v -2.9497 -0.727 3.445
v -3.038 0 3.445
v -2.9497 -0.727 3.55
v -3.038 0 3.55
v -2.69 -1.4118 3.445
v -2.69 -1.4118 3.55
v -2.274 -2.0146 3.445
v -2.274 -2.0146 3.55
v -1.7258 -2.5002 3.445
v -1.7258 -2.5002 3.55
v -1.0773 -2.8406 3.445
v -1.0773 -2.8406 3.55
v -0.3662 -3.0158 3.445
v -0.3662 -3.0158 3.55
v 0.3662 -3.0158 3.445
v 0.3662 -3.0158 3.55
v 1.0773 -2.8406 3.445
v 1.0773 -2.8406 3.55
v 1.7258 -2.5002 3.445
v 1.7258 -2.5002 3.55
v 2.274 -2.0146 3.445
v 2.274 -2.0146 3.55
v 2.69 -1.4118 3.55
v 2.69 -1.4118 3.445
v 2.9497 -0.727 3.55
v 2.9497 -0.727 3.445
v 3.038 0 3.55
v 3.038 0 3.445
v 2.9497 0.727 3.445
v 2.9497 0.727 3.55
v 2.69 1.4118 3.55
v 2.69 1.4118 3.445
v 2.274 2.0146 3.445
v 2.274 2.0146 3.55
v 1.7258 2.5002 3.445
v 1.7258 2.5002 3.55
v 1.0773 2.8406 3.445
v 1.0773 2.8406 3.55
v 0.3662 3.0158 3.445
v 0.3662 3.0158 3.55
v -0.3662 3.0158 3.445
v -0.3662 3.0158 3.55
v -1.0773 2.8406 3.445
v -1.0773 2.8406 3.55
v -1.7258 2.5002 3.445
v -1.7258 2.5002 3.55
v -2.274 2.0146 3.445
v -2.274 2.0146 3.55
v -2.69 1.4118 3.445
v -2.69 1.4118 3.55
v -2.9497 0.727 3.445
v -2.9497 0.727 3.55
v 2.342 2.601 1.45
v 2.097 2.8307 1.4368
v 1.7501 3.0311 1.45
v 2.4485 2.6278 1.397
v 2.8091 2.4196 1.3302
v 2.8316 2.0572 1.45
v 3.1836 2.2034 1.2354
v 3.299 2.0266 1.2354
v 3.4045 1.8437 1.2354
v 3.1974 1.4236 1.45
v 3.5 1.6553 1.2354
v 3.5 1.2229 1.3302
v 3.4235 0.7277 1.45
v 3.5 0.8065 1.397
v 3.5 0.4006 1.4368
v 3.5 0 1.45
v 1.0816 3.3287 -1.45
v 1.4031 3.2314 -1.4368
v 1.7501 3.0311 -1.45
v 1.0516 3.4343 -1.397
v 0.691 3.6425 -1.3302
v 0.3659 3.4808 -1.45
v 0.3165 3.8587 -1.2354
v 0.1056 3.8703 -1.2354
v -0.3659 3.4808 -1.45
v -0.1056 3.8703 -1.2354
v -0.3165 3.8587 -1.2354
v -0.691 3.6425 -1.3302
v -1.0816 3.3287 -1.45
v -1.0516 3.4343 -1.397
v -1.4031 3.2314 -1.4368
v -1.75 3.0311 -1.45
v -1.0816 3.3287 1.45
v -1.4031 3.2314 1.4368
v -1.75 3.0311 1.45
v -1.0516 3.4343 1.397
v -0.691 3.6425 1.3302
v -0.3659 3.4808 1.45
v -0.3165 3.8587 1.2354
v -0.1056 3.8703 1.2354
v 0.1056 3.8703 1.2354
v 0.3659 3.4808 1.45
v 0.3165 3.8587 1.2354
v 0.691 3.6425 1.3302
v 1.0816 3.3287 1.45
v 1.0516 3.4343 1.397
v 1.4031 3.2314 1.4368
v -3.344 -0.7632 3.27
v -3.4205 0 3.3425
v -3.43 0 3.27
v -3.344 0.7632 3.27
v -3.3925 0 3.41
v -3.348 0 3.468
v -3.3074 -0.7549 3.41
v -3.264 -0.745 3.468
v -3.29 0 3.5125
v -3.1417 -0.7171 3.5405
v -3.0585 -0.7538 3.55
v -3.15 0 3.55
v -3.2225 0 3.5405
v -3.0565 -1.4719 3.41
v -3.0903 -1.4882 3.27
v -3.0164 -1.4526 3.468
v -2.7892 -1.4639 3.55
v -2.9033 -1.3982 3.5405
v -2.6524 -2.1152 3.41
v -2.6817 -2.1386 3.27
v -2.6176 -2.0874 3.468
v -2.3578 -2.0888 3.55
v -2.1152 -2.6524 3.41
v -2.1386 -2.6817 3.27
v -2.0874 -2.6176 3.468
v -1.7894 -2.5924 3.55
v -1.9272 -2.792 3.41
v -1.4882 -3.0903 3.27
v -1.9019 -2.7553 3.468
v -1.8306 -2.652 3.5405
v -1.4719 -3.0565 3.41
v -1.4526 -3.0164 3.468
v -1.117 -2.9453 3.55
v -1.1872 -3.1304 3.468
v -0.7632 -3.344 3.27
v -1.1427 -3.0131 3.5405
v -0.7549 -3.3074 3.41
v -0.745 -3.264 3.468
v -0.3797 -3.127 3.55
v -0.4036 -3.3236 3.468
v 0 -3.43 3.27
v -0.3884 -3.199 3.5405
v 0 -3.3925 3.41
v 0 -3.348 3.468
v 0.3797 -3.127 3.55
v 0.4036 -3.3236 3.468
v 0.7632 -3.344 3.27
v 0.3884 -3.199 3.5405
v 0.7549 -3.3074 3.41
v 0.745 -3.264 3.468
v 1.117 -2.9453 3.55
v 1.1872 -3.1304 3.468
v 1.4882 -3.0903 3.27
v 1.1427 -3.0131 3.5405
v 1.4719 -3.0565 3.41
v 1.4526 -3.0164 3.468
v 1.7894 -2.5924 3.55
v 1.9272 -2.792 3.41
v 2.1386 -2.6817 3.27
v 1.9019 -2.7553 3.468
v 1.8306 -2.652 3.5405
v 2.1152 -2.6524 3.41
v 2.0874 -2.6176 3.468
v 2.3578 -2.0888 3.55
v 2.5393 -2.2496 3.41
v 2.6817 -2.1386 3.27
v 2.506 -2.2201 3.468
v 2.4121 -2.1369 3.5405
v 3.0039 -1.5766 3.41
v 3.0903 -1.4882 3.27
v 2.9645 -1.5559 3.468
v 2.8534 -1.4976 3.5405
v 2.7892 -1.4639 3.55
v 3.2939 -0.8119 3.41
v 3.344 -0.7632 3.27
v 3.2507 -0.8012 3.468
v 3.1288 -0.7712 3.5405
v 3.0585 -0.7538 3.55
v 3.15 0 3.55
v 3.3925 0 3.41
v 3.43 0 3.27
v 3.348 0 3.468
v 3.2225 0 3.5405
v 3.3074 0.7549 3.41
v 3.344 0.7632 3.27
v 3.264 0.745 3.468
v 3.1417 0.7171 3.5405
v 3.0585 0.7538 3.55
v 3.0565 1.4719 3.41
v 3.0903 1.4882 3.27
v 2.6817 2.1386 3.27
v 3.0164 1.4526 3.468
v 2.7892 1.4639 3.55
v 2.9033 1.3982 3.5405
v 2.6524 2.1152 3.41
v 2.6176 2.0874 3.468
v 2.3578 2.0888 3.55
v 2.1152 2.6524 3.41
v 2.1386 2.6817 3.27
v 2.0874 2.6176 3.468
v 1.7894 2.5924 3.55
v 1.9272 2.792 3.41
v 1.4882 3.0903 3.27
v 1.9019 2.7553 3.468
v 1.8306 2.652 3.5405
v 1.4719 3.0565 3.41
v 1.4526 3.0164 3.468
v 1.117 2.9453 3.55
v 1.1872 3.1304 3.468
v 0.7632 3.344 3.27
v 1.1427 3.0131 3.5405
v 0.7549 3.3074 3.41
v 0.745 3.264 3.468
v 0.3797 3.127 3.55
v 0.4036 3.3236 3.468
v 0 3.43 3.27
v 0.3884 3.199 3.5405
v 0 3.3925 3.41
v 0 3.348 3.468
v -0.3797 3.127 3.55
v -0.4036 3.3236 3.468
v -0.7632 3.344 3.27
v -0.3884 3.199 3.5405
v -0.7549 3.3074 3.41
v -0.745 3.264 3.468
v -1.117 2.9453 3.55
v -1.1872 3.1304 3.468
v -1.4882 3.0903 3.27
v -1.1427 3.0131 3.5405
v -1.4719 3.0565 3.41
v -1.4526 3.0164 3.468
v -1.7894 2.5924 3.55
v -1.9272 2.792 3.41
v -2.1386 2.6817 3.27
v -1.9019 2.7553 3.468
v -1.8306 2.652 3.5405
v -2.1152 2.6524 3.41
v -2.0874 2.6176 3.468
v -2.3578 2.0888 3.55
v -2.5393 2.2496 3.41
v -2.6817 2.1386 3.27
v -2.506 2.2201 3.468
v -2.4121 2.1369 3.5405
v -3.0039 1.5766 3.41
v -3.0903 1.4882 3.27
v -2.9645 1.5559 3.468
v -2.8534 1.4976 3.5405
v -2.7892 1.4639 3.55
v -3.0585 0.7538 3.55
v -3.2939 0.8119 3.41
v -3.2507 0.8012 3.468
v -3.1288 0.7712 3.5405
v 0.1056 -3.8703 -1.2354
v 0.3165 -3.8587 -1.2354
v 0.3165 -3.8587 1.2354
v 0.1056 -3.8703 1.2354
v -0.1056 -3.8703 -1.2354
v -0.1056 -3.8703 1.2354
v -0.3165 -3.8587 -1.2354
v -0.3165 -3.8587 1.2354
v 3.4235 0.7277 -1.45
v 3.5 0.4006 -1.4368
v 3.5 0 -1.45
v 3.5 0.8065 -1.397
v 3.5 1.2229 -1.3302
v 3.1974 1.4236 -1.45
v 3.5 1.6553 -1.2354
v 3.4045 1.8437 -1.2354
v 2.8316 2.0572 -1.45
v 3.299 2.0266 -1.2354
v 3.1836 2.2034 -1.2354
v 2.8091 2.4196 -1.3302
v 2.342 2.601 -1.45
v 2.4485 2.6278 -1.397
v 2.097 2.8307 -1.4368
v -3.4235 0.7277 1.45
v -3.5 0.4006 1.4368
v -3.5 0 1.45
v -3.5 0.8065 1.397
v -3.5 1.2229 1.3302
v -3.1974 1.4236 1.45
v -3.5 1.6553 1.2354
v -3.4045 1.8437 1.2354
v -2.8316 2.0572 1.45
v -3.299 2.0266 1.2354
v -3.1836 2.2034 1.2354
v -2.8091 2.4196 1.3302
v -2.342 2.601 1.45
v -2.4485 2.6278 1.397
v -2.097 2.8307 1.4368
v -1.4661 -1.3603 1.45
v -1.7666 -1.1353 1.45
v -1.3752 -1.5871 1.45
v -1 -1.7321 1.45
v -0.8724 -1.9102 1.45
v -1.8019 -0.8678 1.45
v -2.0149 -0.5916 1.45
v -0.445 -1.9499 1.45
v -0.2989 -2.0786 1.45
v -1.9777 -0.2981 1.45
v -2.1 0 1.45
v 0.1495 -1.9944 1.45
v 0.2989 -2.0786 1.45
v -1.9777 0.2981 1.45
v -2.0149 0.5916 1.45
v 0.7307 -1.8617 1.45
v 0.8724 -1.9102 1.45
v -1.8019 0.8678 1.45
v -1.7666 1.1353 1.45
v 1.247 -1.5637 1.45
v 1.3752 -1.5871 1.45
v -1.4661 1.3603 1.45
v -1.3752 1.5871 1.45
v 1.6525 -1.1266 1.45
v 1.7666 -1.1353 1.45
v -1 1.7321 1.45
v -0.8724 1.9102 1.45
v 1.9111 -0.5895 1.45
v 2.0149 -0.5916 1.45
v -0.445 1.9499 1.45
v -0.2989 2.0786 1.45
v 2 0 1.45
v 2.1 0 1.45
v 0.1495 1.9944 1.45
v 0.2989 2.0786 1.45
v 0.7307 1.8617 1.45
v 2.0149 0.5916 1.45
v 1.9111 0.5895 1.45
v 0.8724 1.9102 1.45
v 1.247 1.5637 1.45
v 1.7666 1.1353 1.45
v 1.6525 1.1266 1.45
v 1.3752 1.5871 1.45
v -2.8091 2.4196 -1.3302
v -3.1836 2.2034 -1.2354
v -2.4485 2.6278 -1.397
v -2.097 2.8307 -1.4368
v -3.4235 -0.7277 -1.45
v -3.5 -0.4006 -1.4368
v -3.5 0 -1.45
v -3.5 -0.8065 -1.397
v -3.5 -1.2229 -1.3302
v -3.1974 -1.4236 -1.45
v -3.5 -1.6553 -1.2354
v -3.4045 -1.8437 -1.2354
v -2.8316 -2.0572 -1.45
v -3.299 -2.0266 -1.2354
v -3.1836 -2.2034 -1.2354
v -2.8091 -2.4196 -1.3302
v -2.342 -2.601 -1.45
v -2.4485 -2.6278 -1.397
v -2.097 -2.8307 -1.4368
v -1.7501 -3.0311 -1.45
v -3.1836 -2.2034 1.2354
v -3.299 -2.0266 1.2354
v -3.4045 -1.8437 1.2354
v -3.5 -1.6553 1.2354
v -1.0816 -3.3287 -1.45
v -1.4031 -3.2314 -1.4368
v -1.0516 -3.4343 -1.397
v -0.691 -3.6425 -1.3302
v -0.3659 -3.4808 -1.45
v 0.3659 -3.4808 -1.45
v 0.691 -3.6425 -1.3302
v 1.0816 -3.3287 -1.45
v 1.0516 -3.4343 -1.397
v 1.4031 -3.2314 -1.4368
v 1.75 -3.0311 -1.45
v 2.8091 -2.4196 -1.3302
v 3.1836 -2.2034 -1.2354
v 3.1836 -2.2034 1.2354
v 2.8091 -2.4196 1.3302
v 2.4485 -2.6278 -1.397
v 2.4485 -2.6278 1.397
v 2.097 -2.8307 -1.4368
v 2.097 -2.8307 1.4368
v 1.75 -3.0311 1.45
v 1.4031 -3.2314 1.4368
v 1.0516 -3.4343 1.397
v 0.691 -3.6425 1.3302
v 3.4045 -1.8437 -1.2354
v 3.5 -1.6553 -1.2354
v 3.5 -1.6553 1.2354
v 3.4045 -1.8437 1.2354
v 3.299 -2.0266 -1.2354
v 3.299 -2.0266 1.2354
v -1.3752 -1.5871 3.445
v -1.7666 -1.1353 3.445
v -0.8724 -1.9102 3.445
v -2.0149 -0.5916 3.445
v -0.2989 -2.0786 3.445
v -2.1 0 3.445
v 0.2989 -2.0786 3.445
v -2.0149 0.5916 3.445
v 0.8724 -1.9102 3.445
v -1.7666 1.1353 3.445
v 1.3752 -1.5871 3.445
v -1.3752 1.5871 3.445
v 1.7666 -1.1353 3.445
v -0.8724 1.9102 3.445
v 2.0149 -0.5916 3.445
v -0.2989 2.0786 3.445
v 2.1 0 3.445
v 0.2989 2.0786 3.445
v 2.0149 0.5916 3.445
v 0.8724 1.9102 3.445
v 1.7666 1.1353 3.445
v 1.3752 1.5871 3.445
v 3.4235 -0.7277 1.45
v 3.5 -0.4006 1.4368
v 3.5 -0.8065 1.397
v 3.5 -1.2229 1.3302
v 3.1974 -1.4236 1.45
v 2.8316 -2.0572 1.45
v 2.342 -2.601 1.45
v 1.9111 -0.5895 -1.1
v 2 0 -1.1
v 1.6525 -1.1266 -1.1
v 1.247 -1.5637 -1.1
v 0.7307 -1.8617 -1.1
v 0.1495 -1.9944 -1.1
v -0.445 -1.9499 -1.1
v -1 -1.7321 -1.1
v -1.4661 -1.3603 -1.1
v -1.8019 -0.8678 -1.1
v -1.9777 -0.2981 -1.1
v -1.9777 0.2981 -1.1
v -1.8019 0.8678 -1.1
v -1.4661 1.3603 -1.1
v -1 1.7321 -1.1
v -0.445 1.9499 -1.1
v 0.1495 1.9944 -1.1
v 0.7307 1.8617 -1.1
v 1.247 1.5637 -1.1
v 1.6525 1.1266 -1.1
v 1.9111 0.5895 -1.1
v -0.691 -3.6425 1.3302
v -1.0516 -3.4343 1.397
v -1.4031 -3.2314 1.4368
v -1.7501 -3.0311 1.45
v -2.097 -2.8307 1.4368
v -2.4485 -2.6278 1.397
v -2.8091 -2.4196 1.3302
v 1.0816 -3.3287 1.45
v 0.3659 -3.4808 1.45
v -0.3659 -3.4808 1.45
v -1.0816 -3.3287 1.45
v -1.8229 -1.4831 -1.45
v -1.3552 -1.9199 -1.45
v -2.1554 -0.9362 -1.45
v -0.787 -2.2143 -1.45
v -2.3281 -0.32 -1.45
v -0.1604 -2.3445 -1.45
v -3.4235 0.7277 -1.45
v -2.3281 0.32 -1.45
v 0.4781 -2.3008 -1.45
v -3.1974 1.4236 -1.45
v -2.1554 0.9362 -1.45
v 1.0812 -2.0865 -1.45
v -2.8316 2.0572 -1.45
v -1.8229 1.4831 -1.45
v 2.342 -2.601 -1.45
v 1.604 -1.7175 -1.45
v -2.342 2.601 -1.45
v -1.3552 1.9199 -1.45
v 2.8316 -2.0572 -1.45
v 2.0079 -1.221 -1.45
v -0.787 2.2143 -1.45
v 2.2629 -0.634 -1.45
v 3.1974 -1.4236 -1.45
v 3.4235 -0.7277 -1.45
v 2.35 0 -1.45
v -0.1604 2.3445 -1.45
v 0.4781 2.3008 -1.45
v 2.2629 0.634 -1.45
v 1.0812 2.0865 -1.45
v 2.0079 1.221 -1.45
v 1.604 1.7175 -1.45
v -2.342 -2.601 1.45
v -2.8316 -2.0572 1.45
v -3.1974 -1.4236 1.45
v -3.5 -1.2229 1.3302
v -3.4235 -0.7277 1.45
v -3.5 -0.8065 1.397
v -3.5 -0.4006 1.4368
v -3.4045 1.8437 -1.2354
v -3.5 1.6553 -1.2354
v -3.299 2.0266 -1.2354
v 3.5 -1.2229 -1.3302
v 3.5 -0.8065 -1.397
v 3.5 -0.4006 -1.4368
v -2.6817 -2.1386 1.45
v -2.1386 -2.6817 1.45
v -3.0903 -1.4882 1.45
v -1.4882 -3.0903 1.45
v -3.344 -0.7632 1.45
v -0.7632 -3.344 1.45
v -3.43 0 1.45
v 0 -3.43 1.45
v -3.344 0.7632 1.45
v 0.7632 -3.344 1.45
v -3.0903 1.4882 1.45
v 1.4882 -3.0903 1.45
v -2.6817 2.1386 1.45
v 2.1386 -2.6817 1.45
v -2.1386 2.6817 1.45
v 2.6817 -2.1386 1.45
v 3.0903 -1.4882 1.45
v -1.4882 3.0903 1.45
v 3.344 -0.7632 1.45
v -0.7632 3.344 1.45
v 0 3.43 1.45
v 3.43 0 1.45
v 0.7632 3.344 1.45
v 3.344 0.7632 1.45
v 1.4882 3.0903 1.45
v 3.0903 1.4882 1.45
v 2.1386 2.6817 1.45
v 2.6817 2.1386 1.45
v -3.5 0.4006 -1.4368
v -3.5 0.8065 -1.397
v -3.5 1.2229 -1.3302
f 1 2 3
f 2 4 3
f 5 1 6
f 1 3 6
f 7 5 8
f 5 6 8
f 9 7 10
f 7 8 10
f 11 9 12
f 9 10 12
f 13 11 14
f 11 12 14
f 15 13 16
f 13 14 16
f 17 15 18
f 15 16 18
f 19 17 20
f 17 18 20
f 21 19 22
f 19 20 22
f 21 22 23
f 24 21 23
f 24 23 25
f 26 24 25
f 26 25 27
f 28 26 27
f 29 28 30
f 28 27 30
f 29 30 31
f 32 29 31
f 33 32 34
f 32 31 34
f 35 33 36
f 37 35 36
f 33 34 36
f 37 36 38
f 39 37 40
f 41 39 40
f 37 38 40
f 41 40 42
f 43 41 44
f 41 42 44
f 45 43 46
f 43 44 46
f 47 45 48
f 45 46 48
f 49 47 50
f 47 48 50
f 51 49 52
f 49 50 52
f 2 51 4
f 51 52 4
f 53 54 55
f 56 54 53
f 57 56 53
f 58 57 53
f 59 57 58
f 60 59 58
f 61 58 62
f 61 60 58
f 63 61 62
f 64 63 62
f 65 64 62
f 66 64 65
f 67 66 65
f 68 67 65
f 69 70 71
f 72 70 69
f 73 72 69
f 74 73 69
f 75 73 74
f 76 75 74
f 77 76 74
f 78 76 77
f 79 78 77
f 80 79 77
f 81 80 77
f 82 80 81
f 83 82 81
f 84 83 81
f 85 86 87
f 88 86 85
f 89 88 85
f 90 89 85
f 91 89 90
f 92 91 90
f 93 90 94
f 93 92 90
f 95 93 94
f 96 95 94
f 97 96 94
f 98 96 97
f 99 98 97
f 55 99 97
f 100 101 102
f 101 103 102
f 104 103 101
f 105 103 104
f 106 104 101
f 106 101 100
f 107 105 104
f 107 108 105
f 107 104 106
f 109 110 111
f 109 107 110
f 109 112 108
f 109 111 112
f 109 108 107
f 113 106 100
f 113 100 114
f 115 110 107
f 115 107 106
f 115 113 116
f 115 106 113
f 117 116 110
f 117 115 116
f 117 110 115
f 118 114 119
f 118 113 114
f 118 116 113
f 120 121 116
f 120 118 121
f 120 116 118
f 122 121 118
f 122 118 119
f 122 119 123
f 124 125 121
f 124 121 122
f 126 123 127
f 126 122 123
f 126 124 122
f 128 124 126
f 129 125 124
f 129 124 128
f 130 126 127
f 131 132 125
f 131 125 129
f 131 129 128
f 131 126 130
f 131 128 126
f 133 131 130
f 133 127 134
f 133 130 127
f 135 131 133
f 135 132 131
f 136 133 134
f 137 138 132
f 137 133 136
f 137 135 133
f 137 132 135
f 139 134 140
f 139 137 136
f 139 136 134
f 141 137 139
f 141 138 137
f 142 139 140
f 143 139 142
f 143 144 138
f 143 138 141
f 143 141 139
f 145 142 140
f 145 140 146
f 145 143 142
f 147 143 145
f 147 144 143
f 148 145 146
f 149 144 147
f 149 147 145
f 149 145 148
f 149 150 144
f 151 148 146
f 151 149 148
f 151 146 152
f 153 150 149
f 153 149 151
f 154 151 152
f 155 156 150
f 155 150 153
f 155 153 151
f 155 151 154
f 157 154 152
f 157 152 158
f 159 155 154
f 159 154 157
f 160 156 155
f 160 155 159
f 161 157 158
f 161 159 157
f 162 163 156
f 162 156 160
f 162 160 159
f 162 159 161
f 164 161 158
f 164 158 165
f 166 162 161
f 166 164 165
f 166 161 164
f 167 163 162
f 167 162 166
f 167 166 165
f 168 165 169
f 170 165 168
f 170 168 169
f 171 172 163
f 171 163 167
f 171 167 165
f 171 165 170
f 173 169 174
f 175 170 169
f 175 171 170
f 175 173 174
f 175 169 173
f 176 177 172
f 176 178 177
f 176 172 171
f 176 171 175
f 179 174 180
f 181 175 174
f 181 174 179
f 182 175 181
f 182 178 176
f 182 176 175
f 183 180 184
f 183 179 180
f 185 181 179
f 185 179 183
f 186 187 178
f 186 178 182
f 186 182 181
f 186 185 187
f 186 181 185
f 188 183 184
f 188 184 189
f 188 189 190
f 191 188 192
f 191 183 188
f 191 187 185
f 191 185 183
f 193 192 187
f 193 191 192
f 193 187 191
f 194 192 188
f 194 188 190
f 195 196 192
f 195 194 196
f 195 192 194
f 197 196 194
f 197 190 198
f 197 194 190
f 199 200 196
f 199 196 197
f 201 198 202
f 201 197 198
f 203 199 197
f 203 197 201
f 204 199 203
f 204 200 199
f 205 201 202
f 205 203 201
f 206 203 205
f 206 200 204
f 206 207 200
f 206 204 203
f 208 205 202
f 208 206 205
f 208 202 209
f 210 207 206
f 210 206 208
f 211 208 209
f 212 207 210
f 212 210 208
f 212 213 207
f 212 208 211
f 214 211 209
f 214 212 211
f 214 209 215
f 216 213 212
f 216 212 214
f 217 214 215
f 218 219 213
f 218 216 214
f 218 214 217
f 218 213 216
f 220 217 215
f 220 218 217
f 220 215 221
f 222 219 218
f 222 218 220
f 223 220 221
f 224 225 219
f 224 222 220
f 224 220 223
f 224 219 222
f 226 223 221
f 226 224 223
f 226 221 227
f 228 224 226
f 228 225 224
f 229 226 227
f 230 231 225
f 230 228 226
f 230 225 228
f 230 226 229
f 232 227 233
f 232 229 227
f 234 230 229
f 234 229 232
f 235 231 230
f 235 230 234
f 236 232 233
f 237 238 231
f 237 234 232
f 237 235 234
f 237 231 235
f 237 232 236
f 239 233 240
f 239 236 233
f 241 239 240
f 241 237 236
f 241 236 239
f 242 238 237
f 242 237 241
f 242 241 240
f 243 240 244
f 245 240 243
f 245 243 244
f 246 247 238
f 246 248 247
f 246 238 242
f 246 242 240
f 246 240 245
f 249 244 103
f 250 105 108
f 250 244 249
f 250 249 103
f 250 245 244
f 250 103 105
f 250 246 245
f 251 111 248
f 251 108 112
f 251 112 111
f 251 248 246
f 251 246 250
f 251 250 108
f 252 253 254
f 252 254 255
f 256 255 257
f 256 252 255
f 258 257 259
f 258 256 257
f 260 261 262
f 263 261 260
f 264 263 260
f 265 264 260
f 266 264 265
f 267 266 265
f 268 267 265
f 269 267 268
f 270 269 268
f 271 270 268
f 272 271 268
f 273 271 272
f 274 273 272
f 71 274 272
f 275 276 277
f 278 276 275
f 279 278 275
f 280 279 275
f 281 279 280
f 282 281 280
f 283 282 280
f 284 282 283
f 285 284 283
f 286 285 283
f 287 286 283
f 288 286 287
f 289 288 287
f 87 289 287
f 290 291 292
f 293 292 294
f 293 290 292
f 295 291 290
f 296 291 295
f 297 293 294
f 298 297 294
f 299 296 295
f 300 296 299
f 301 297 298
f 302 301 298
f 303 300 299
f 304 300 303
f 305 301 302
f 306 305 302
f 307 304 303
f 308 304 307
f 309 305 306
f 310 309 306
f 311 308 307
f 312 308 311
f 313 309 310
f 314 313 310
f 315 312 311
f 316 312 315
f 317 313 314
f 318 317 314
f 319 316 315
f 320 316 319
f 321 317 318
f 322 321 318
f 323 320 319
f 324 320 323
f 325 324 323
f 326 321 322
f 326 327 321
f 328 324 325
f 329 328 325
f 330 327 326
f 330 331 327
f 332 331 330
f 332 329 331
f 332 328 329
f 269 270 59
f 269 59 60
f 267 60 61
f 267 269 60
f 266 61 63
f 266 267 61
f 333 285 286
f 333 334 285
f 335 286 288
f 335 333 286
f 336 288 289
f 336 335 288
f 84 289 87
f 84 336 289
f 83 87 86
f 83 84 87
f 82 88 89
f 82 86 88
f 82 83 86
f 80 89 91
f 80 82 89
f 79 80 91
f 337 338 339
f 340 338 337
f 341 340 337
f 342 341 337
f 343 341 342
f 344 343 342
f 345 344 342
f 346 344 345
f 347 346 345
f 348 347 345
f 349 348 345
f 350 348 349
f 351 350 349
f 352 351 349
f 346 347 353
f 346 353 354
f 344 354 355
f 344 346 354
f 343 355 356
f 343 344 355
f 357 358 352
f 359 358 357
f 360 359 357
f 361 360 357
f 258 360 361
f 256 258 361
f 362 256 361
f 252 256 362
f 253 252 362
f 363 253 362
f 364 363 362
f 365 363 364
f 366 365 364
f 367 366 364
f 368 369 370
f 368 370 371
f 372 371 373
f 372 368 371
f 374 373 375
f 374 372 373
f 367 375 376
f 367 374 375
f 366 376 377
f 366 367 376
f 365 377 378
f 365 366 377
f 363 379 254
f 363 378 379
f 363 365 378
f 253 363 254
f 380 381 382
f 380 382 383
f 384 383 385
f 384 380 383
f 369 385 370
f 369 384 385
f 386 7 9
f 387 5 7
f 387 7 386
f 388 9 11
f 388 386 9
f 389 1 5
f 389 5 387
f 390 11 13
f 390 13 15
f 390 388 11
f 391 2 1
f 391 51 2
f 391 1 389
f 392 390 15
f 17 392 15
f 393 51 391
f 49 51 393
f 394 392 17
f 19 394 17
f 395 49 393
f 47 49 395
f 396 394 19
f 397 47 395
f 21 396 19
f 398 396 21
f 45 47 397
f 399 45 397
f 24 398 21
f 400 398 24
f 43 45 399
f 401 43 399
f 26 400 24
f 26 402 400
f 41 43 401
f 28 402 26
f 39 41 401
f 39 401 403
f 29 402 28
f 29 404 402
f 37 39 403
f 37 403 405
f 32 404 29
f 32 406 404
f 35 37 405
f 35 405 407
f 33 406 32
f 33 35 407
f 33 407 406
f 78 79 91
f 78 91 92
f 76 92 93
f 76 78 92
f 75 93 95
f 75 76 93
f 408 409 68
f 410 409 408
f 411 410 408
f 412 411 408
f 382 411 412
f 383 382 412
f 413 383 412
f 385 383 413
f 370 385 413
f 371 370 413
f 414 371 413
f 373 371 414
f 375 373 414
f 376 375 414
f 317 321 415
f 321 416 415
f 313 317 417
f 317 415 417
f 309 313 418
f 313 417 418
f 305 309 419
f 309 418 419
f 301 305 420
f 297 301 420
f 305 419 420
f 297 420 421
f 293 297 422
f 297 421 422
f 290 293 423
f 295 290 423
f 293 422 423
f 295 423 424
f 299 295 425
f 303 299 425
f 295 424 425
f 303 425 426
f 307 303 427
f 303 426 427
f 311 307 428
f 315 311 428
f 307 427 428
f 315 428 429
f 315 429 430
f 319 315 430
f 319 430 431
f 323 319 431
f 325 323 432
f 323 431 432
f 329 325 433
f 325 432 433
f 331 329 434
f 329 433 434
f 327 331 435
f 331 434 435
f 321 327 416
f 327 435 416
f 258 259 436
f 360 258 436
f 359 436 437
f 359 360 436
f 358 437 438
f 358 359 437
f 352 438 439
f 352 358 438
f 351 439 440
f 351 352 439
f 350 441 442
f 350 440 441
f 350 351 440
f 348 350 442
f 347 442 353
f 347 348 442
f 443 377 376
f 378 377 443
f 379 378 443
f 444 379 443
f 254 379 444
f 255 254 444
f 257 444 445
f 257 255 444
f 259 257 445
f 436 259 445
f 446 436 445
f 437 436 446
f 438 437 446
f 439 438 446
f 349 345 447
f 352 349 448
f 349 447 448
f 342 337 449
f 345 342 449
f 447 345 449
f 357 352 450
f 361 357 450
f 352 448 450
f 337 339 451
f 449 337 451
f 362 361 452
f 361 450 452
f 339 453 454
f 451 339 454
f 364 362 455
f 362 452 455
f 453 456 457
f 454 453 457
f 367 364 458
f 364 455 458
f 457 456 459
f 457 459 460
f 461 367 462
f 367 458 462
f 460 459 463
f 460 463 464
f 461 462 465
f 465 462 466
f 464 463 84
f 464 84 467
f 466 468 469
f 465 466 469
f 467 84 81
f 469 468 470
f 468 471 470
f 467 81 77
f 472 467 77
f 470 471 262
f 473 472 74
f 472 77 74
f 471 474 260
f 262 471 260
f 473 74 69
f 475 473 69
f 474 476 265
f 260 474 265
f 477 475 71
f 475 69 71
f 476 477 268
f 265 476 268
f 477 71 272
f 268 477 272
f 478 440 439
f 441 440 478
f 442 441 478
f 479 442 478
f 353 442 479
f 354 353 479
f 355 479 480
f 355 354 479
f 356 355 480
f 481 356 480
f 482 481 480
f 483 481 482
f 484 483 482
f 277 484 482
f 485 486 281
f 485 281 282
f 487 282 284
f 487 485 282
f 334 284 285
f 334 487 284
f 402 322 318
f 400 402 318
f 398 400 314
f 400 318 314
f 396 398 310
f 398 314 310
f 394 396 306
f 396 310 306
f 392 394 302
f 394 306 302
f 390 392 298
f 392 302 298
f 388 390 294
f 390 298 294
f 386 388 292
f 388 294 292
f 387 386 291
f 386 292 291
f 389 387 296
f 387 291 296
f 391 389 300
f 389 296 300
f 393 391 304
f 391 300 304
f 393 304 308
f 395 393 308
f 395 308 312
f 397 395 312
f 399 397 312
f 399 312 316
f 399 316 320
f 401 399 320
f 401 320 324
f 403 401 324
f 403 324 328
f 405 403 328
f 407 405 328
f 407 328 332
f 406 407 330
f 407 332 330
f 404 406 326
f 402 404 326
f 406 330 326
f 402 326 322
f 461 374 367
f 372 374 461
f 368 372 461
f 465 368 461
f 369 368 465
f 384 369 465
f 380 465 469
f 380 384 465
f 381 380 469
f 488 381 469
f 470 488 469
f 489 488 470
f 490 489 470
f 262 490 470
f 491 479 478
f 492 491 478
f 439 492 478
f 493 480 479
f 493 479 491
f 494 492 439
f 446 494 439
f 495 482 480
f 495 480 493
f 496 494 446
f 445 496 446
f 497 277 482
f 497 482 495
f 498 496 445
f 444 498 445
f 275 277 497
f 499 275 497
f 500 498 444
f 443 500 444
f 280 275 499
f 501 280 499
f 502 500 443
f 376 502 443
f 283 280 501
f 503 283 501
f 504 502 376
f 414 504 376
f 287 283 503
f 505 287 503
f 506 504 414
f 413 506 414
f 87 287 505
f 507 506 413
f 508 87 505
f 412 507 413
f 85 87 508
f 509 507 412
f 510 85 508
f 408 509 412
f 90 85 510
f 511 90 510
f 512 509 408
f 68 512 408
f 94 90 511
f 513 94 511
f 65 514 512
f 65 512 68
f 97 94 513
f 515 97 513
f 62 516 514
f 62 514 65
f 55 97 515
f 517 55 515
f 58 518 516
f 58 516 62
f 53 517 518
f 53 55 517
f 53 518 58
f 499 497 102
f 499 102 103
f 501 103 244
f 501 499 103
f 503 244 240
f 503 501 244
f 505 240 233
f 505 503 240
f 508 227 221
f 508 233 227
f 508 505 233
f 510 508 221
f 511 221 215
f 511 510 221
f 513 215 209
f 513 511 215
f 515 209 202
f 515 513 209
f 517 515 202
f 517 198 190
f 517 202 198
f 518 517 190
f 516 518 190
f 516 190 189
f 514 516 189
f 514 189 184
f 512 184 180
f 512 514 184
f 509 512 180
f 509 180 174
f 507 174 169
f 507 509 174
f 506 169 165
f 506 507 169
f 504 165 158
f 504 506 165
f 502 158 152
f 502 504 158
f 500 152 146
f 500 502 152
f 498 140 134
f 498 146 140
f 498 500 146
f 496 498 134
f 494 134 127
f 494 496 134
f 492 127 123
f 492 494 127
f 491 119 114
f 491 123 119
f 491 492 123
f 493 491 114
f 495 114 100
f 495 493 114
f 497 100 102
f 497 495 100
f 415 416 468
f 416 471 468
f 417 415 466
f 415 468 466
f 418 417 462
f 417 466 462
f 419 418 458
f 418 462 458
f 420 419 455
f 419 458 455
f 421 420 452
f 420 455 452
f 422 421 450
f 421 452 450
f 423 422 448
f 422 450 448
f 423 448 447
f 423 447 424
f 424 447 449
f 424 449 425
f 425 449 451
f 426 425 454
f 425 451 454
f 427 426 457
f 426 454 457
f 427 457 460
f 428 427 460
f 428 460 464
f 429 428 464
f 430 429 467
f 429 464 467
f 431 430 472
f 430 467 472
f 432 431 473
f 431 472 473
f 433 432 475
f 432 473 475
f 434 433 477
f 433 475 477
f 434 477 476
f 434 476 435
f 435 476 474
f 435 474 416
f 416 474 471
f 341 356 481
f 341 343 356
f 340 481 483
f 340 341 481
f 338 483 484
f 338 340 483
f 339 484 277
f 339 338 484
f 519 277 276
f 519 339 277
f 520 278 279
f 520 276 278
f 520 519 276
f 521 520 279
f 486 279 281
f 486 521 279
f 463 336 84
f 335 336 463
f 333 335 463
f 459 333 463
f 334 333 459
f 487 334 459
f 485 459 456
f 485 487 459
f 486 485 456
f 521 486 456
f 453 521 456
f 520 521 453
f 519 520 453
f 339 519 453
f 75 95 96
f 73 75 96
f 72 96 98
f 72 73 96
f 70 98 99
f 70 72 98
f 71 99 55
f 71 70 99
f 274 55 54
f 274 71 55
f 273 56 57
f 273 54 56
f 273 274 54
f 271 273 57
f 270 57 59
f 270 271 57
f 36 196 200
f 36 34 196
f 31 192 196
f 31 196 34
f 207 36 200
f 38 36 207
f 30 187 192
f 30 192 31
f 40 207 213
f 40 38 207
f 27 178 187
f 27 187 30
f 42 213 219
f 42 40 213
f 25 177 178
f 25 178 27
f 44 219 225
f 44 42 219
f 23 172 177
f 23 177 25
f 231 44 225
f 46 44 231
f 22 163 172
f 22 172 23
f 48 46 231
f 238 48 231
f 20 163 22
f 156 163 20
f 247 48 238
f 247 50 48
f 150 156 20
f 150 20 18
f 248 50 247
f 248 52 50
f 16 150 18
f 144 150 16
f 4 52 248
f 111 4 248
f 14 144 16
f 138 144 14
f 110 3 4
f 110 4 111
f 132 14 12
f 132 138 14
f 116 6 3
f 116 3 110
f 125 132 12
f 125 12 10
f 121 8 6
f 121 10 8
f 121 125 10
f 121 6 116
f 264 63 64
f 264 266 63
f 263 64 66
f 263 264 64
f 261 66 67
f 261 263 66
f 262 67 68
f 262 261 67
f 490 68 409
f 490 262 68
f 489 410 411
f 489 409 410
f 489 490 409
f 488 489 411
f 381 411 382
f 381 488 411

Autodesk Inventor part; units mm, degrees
ref_plane "YZ Plane" through (0, 0, 0) normal (1, 0, 0) x (0, 1, 0)
ref_plane "XZ Plane" through (0, 0, 0) normal (0, 1, 0) x (-1, 0, 0)
ref_plane "XY Plane" through (0, 0, 0) normal (0, 0, 1) x (1, 0, 0)
sketch "Sketch1" plane through (0, 0, 0) normal (0, 0, 1) x (1, 0, 0)
  circle A0 centre (0, 0) radius 2
  line L0 (0, 4.0415) -> (3.5, 2.0207)
  line L1 (3.5, 2.0207) -> (3.5, -2.0207)
  line L2 (3.5, -2.0207) -> (0, -4.0415)
  line L3 (0, -4.0415) -> (-3.5, -2.0207)
  line L4 (-3.5, -2.0207) -> (-3.5, 2.0207)
  line L5 (-3.5, 2.0207) -> (0, 4.0415)
  dimension "Sw" = 7
  dimension "Diameter" = 4
extrude "Extrusion1" add sketch "Sketch1" along normal mid plane 2.9
thread "Thread1" size "M4x0.7" class "6H" standard "ANSI Metric M Profile" length 2.9
sketch "Sketch4" plane through (0, 0, 0) normal (0, 1, 0) x (-1, 0, 0)
  line L0 (0, -1.45) -> (0, 1.45) projected
  line L1 (0, -1.45) -> (-3.5, -1.45)
  line L2 (-3.5, -1.45) -> (-4.0415, -1.1374)
  line L3 (-4.0415, -1.1374) -> (-4.0415, -1.45)
  line L4 (-4.0415, -1.45) -> (-3.5, -1.45)
  line L5 (0, -2.03) -> (0, 2.03) projected
  dimension "d6" = 4.0415
  dimension "d7" = 30
  dimension "d8" = 3.5
revolve "Revolution1" cut sketch "Sketch4" angle 360 about axis through (0, 0, -10) along (0, 0, 1)
mirror "Mirror1" about plane through (0, 0, 0) normal (0, 0, 1) of "Revolution1"
sketch "Sketch6" plane through (0, 0, -1.45) normal (0, 0, -1) x (-1, 0, 0)
  circle A0 centre (0, 0) radius 2 projected
  circle A1 centre (0, 0) radius 3.8717
  dimension "d15" = 7.7434
extrude "Extrusion3" cut sketch "Sketch6" against normal through all keep common part
chamfer "Chamfer2" distance 0.35 angle 45 1 edges at (-2, 0, -1.45)
sketch "Sketch8" plane through (0, 0, 1.45) normal (0, 0, 1) x (1, 0, 0)
  line L0 (-2.5, 0) -> (3.5, 0)
  circle A0 centre (0, 0) radius 3.15
  circle A1 centre (0, 0) radius 2.1
  dimension "d22" = 6.3
  dimension "d34" = 4.2
extrude "Extrusion6" add sketch "Sketch8" along normal blind 1.995
sketch "Sketch11" plane through (0, 0, 0) normal (0, 1, 0) x (-1, 0, 0)
  line L0 (1.75, -1.45) -> (3.5, -1.45) projected
  line L1 (3.15, 3.55) -> (0, 3.55)
  line L2 (3.5, 1.45) -> (1.75, 1.45) projected
  line L3 (3.43, 3.27) -> (3.43, 1.45)
  line L4 (3.15, 1.45) -> (3.15, 3.445) projected
  line L5 (2.1, 1.45) -> (2.1, 3.445) projected
  line L6 (0, -2.4616) -> (0, 4.6196) projected
  arc A0 (3.43, 3.27) -> (3.15, 3.55) centre (3.15, 3.27) ccw
  line L7 (3.15, 3.445) -> (3.038, 3.445)
  line L8 (3.038, 3.445) -> (3.038, 3.55)
  dimension "d35" = 5
  dimension "d36" = 3.43
  dimension "d37" = 0.28
  dimension "d38" = 0.28
  dimension "d40" = 0.392
revolve "Revolution2" add sketch "Sketch11" angle 360 about axis through (0, 0, -10) along (0, 0, 1)
equation "\"d4\" = M"
equation "\"d6\" = 0.57735 * Sw"
equation "\"d8\" = 0.5 * Sw"
equation "\"d15\" = 1.10619 * Sw"
equation "\"d20\" = 0.5 * Pitch"
equation "\"d21\" = 0.5 * Pitch"
equation "\"d22\" = 0.9 * Sw"
equation "\"d34\" = 1.05 * Diameter"
equation "\"d25\" = -0.95 * M + 0.95 * h"
equation "\"d35\" = h"
equation "\"d36\" = 0.49 * Sw"
equation "\"d38\" = d37"
equation "\"d40\" = 1.4 * d38"
equation "\"M\" = 2.9"
equation "\"Pitch\" = 0.7"
equation "\"h\" = 5"
properties part number "11-4503" material "Steel, Mild"
